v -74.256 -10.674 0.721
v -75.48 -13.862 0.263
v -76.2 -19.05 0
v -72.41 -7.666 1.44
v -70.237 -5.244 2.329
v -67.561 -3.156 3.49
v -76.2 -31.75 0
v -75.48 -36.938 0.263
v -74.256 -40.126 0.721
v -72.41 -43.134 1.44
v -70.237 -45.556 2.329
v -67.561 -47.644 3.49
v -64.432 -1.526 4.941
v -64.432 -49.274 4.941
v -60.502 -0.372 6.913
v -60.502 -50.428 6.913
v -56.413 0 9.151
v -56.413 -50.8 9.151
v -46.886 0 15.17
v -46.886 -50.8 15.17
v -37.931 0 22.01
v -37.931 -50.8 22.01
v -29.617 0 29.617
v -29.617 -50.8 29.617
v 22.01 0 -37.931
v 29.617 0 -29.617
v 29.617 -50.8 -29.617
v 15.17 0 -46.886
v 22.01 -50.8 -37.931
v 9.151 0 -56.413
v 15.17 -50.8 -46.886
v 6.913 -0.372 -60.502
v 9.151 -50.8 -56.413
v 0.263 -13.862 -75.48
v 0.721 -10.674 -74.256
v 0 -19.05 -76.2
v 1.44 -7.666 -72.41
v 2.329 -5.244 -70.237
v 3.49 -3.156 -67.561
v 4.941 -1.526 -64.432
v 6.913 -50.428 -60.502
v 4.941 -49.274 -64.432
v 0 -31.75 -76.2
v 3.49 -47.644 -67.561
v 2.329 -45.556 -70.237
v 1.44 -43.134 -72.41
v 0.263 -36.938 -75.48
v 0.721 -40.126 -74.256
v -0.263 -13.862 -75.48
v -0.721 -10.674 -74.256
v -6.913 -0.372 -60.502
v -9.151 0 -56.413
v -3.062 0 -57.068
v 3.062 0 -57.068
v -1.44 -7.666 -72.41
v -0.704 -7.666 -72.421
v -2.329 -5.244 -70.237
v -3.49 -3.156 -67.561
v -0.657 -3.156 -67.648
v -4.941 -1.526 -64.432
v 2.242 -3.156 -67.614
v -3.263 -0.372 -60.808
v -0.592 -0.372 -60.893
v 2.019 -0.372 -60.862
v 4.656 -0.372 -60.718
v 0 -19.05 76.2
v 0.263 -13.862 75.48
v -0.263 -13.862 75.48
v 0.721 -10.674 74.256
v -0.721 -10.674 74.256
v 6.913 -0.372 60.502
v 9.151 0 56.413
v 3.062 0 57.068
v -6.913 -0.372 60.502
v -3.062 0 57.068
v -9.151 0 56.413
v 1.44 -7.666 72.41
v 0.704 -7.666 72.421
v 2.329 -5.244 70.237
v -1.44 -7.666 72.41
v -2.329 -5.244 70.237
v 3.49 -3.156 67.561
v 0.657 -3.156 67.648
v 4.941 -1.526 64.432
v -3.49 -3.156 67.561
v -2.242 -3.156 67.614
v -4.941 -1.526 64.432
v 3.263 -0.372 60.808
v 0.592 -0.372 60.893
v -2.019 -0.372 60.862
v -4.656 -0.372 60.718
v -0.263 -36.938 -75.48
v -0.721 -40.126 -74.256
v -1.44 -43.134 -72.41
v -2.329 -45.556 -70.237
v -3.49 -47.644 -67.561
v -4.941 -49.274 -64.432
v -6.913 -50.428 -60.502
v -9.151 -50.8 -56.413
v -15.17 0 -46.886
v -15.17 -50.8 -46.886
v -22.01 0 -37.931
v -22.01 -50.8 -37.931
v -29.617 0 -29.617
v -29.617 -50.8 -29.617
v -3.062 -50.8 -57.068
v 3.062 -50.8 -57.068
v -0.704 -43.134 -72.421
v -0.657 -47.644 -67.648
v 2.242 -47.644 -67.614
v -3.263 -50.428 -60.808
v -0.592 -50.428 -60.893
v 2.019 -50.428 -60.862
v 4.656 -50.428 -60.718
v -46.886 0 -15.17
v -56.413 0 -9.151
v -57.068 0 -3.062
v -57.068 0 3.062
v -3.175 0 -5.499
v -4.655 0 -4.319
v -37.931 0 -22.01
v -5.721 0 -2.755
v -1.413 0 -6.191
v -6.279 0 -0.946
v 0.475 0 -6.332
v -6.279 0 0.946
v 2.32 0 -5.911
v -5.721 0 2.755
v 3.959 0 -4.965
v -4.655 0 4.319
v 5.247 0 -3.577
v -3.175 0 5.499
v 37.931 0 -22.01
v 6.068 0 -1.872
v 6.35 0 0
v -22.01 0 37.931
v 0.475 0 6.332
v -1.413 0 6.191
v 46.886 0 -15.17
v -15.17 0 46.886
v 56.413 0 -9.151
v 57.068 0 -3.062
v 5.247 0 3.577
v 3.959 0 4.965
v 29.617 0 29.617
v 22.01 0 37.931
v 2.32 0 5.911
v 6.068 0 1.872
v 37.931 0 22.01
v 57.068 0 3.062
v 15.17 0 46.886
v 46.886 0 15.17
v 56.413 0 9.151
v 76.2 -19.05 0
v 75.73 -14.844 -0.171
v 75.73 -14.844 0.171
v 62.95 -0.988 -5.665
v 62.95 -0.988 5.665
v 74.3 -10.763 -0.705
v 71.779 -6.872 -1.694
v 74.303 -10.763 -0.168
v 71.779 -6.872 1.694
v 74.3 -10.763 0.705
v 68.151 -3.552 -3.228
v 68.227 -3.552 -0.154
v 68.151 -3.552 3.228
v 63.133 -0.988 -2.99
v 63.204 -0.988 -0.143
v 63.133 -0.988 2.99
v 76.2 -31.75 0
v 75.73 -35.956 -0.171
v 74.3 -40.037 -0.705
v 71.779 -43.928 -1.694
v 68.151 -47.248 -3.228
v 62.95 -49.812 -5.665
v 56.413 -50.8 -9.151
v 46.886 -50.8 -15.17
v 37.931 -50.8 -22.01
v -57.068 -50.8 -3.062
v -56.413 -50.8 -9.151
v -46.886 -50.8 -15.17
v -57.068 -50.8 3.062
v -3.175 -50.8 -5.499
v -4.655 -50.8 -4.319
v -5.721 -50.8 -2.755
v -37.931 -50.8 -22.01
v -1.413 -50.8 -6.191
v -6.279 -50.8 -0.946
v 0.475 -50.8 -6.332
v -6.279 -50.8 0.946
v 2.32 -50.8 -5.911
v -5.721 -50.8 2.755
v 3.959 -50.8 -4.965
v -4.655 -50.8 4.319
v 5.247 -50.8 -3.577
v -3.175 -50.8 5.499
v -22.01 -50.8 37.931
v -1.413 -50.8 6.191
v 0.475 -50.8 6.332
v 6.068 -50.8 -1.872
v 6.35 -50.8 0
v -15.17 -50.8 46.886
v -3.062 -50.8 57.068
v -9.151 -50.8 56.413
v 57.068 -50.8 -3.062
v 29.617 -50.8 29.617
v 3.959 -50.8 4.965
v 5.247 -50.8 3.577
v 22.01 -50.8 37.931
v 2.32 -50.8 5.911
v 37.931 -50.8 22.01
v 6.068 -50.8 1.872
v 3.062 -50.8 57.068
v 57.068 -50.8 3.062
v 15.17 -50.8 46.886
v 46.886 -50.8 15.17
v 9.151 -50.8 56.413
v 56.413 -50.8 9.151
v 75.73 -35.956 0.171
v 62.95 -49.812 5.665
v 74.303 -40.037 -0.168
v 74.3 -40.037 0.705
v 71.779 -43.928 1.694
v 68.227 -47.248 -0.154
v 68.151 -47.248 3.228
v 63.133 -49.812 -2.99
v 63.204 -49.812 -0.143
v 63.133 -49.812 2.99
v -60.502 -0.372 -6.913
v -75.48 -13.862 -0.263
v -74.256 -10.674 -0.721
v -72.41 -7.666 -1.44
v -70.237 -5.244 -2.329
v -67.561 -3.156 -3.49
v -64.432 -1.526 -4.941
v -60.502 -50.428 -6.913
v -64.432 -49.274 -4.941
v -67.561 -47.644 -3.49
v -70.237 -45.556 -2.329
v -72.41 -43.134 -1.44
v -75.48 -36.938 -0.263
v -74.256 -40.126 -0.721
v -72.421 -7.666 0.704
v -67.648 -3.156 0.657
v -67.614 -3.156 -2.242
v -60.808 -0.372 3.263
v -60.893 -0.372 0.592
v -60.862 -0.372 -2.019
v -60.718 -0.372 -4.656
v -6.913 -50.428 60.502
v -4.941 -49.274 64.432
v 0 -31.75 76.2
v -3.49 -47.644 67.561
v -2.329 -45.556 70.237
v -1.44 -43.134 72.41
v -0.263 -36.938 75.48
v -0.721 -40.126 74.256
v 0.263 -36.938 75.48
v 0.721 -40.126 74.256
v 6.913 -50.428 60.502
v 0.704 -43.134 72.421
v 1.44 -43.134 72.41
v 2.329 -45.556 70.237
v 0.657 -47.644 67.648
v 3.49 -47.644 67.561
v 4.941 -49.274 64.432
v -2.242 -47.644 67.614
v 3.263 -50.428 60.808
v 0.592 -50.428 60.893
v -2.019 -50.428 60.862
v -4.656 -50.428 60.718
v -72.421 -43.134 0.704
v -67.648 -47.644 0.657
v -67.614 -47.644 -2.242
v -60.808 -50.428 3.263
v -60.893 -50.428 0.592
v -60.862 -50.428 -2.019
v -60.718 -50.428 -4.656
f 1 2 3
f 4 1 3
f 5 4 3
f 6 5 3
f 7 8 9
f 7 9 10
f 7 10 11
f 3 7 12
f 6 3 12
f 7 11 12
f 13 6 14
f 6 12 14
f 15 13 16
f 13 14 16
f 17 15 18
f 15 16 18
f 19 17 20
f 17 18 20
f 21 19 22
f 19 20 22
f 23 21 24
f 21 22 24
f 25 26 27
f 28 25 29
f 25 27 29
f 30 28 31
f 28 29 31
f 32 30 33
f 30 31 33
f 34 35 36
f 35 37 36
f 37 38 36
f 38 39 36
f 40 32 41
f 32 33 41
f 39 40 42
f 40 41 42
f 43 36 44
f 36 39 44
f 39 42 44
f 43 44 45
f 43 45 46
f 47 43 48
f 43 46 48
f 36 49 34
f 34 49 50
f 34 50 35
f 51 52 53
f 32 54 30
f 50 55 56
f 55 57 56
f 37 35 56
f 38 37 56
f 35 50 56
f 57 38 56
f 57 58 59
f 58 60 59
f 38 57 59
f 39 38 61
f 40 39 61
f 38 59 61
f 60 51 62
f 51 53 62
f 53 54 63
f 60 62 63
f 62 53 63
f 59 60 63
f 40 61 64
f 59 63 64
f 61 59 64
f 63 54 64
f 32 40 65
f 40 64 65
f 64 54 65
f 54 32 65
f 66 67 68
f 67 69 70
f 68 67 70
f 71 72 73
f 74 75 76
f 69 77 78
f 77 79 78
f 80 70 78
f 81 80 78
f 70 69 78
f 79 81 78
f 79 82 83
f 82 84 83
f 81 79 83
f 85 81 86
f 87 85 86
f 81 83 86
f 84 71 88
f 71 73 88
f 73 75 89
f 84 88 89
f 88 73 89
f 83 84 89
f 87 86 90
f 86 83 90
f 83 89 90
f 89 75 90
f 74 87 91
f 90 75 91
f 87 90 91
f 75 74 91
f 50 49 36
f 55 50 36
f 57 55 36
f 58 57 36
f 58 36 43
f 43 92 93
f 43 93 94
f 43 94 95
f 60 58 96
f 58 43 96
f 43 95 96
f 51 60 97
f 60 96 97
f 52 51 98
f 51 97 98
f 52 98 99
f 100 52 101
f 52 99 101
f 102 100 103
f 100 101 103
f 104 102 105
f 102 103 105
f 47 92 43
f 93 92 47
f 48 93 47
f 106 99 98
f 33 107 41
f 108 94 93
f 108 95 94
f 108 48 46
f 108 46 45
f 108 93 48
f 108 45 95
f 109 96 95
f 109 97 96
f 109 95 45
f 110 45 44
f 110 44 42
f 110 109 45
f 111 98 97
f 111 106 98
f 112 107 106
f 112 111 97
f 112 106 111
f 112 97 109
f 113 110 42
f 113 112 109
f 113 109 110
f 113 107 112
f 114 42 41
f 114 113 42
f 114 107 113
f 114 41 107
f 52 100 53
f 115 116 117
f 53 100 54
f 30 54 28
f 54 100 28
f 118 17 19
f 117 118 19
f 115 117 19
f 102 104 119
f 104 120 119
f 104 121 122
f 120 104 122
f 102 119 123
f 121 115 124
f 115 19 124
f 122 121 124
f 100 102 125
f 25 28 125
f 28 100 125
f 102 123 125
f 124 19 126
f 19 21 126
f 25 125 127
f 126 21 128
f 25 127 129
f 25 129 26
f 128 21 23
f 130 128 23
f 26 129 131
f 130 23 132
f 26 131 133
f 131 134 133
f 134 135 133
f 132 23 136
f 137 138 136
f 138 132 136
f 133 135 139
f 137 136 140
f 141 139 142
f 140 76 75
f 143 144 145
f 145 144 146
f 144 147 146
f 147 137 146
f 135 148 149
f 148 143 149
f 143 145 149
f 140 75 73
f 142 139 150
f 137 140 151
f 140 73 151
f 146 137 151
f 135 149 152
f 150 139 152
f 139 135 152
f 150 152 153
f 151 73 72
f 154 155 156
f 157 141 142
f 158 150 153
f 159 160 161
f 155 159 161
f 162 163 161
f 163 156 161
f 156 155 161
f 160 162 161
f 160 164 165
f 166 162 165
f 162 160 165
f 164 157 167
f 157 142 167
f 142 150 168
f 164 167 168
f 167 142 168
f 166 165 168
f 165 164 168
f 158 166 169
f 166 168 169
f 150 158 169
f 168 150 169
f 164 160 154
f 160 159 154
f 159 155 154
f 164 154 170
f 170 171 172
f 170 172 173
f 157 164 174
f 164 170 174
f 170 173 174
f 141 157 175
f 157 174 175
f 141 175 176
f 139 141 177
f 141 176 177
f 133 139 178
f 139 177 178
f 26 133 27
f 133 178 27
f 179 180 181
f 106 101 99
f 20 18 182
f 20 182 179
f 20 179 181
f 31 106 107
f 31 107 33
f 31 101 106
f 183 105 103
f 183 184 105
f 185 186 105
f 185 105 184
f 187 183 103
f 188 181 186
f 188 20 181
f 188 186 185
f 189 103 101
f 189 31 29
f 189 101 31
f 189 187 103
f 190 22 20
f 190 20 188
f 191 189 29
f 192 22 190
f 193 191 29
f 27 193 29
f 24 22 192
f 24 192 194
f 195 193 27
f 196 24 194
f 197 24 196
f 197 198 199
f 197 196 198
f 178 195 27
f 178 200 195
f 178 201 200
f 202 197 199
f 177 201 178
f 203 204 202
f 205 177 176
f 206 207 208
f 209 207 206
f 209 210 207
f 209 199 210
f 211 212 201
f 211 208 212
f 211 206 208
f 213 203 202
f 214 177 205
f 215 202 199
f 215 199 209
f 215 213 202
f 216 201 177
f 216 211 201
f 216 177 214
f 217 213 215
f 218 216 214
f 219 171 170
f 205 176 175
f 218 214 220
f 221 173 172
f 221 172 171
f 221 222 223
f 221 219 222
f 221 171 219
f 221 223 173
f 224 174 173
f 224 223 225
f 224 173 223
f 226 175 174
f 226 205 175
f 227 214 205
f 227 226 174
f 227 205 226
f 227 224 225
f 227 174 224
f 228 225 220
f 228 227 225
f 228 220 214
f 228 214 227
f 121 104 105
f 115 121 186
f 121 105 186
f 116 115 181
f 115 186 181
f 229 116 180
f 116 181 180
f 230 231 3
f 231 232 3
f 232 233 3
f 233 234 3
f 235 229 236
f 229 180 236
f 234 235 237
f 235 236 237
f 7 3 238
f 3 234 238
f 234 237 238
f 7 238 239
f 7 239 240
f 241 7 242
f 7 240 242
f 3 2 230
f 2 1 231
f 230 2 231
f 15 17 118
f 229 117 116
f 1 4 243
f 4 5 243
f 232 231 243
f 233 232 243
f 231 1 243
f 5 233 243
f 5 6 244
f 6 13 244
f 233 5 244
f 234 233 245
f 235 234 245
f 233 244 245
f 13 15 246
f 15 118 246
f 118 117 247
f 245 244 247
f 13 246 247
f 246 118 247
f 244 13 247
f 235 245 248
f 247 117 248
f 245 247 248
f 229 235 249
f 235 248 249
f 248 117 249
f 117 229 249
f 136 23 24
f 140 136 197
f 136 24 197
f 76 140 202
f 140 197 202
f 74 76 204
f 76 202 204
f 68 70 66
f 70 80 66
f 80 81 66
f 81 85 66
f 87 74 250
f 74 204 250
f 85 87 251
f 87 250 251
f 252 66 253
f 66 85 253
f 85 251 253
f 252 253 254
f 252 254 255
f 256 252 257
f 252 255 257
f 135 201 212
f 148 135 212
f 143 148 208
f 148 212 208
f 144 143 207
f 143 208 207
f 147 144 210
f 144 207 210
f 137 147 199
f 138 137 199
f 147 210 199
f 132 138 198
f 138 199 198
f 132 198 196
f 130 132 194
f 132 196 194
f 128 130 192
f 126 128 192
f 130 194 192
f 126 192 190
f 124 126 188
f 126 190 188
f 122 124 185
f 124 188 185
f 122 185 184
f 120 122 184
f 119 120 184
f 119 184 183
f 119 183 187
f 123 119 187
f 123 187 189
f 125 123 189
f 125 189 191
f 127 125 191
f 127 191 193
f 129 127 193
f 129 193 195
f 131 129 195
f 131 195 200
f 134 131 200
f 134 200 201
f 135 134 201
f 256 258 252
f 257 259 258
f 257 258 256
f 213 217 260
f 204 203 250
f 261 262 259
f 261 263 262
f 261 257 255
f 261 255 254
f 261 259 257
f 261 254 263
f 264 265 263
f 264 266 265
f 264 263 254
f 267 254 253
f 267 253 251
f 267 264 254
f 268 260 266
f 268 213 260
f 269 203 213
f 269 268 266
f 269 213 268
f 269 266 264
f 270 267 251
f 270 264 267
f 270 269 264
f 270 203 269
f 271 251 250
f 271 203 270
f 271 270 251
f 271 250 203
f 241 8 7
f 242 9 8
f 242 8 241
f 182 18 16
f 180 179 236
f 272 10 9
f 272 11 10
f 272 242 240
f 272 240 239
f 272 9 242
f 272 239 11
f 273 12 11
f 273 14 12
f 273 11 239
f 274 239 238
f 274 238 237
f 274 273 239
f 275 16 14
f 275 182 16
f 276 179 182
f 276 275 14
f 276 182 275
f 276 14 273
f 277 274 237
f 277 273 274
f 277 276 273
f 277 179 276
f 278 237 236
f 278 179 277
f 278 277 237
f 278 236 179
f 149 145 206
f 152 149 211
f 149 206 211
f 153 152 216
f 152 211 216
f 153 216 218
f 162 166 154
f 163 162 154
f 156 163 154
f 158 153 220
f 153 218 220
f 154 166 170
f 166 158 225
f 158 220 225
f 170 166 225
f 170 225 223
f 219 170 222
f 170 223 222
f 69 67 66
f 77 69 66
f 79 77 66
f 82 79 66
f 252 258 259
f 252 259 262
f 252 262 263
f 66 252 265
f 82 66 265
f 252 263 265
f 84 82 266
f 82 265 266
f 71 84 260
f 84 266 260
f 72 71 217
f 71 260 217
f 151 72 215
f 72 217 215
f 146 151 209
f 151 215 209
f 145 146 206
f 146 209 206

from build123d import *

# Parameters (mm, degrees)
F0_R     = 76.2
F1_DEPTH = 50.8
F3_R     = 19.05
F4_DEPTH = 50.801
F5_R     = 6.35
F6_DEPTH = 50.8010001


with BuildPart() as f1:
    # F0 (on Front) → F1 (new body)
    with BuildSketch(Plane.XZ):
        Circle(F0_R)
    extrude(amount=F1_DEPTH)

    # F3
    f3_edges = [f1.edges().sort_by_distance(p)[0] for p in [
        (76.2, -25.4, 0),
        (-76.2, 0, 0),
        (-76.2, -50.8, 0),
    ]]
    fillet(f3_edges, radius=F3_R)

    # F2 (on face) → F4 (cut, through all)
    with BuildSketch(Plane.XZ.offset(50.8)):
        with BuildLine():
            ThreePointArc((-29.6171166047, 29.6171166047), (-12.2470246704, 51.2799506522), (0, 76.2))
            Line((0, 76.2), (-38.1, 38.1))
            Line((-38.1, 38.1), (-29.6171166047, 29.6171166047))
        make_face()
        with BuildLine():
            Line((-29.6171166047, 29.6171166047), (-38.1, 38.1))
            Line((-38.1, 38.1), (-76.2, 0))
            ThreePointArc((-76.2, 0), (-51.2799506522, 12.2470246704), (-29.6171166047, 29.6171166047))
        make_face()
        with BuildLine():
            Line((0, -76.2), (38.1, -38.1))
            Line((38.1, -38.1), (29.6171166047, -29.6171166047))
            ThreePointArc((29.6171166047, -29.6171166047), (12.2470246704, -51.2799506522), (0, -76.2))
        make_face()
        with BuildLine():
            Line((38.1, -38.1), (76.2, 0))
            ThreePointArc((76.2, 0), (51.2799506522, -12.2470246704), (29.6171166047, -29.6171166047))
            Line((29.6171166047, -29.6171166047), (38.1, -38.1))
        make_face()
        with BuildLine():
            ThreePointArc((29.6171166047, 29.6171166047), (51.2799506522, 12.2470246704), (76.2, 0))
            Line((76.2, 0), (38.1, 38.1))
            Line((38.1, 38.1), (29.6171166047, 29.6171166047))
        make_face()
        with BuildLine():
            Line((38.1, 38.1), (0, 76.2))
            ThreePointArc((0, 76.2), (12.2470246704, 51.2799506522), (29.6171166047, 29.6171166047))
            Line((29.6171166047, 29.6171166047), (38.1, 38.1))
        make_face()
        with BuildLine():
            ThreePointArc((-29.6171166047, -29.6171166047), (-51.2799506522, -12.2470246704), (-76.2, 0))
            Line((-76.2, 0), (-38.1, -38.1))
            Line((-38.1, -38.1), (-29.6171166047, -29.6171166047))
        make_face()
        with BuildLine():
            Line((-38.1, -38.1), (0, -76.2))
            ThreePointArc((0, -76.2), (-12.2470246704, -51.2799506522), (-29.6171166047, -29.6171166047))
            Line((-29.6171166047, -29.6171166047), (-38.1, -38.1))
        make_face()
        with BuildLine():
            Line((53.8815367264, 53.8815367264), (76.2, 76.2))
            Line((76.2, 76.2), (0, 76.2))
            ThreePointArc((0, 76.2), (29.1604775462, 70.3996203774), (53.8815367264, 53.8815367264))
        make_face()
        with BuildLine():
            ThreePointArc((-53.8815367264, 53.8815367264), (-29.1604775462, 70.3996203774), (0, 76.2))
            Line((0, 76.2), (-76.2, 76.2))
            Line((-76.2, 76.2), (-53.8815367264, 53.8815367264))
        make_face()
        with BuildLine():
            Line((0, -76.2), (76.2, -76.2))
            Line((76.2, -76.2), (53.8815367264, -53.8815367264))
            ThreePointArc((53.8815367264, -53.8815367264), (29.1604775462, -70.3996203774), (0, -76.2))
        make_face()
        with BuildLine():
            Line((-76.2, -76.2), (0, -76.2))
            ThreePointArc((0, -76.2), (-29.1604775462, -70.3996203774), (-53.8815367264, -53.8815367264))
            Line((-53.8815367264, -53.8815367264), (-76.2, -76.2))
        make_face()
        with BuildLine():
            Line((76.2, 0), (76.2, 76.2))
            Line((76.2, 76.2), (53.8815367264, 53.8815367264))
            ThreePointArc((53.8815367264, 53.8815367264), (70.3996203774, 29.1604775462), (76.2, 0))
        make_face()
        with BuildLine():
            Line((76.2, -76.2), (76.2, 0))
            ThreePointArc((76.2, 0), (70.3996203774, -29.1604775462), (53.8815367264, -53.8815367264))
            Line((53.8815367264, -53.8815367264), (76.2, -76.2))
        make_face()
        with BuildLine():
            Line((-53.8815367264, 53.8815367264), (-76.2, 76.2))
            Line((-76.2, 76.2), (-76.2, 0))
            ThreePointArc((-76.2, 0), (-70.3996203774, 29.1604775462), (-53.8815367264, 53.8815367264))
        make_face()
        with BuildLine():
            ThreePointArc((-53.8815367264, -53.8815367264), (-70.3996203774, -29.1604775462), (-76.2, 0))
            Line((-76.2, 0), (-76.2, -76.2))
            Line((-76.2, -76.2), (-53.8815367264, -53.8815367264))
        make_face()
        with BuildLine():
            Line((-38.1, 38.1), (0, 76.2))
            ThreePointArc((0, 76.2), (-29.1604775462, 70.3996203774), (-53.8815367264, 53.8815367264))
            Line((-53.8815367264, 53.8815367264), (-38.1, 38.1))
        make_face()
        with BuildLine():
            Line((-76.2, 0), (-38.1, 38.1))
            Line((-38.1, 38.1), (-53.8815367264, 53.8815367264))
            ThreePointArc((-53.8815367264, 53.8815367264), (-70.3996203774, 29.1604775462), (-76.2, 0))
        make_face()
        with BuildLine():
            Line((53.8815367264, -53.8815367264), (38.1, -38.1))
            Line((38.1, -38.1), (0, -76.2))
            ThreePointArc((0, -76.2), (29.1604775462, -70.3996203774), (53.8815367264, -53.8815367264))
        make_face()
        with BuildLine():
            ThreePointArc((53.8815367264, -53.8815367264), (70.3996203774, -29.1604775462), (76.2, 0))
            Line((76.2, 0), (38.1, -38.1))
            Line((38.1, -38.1), (53.8815367264, -53.8815367264))
        make_face()
        with BuildLine():
            Line((38.1, 38.1), (76.2, 0))
            ThreePointArc((76.2, 0), (70.3996203774, 29.1604775462), (53.8815367264, 53.8815367264))
            Line((53.8815367264, 53.8815367264), (38.1, 38.1))
        make_face()
        with BuildLine():
            ThreePointArc((53.8815367264, 53.8815367264), (29.1604775462, 70.3996203774), (0, 76.2))
            Line((0, 76.2), (38.1, 38.1))
            Line((38.1, 38.1), (53.8815367264, 53.8815367264))
        make_face()
        with BuildLine():
            Line((-38.1, -38.1), (-76.2, 0))
            ThreePointArc((-76.2, 0), (-70.3996203774, -29.1604775462), (-53.8815367264, -53.8815367264))
            Line((-53.8815367264, -53.8815367264), (-38.1, -38.1))
        make_face()
        with BuildLine():
            ThreePointArc((-53.8815367264, -53.8815367264), (-29.1604775462, -70.3996203774), (0, -76.2))
            Line((0, -76.2), (-38.1, -38.1))
            Line((-38.1, -38.1), (-53.8815367264, -53.8815367264))
        make_face()
    extrude(amount=-F4_DEPTH, mode=Mode.SUBTRACT)

    # F5 (on face) → F6 (cut, through all)
    with BuildSketch(Plane.XZ.offset(50.8)):
        Circle(F5_R)
    extrude(amount=-F6_DEPTH, mode=Mode.SUBTRACT)


solid = f1.part
